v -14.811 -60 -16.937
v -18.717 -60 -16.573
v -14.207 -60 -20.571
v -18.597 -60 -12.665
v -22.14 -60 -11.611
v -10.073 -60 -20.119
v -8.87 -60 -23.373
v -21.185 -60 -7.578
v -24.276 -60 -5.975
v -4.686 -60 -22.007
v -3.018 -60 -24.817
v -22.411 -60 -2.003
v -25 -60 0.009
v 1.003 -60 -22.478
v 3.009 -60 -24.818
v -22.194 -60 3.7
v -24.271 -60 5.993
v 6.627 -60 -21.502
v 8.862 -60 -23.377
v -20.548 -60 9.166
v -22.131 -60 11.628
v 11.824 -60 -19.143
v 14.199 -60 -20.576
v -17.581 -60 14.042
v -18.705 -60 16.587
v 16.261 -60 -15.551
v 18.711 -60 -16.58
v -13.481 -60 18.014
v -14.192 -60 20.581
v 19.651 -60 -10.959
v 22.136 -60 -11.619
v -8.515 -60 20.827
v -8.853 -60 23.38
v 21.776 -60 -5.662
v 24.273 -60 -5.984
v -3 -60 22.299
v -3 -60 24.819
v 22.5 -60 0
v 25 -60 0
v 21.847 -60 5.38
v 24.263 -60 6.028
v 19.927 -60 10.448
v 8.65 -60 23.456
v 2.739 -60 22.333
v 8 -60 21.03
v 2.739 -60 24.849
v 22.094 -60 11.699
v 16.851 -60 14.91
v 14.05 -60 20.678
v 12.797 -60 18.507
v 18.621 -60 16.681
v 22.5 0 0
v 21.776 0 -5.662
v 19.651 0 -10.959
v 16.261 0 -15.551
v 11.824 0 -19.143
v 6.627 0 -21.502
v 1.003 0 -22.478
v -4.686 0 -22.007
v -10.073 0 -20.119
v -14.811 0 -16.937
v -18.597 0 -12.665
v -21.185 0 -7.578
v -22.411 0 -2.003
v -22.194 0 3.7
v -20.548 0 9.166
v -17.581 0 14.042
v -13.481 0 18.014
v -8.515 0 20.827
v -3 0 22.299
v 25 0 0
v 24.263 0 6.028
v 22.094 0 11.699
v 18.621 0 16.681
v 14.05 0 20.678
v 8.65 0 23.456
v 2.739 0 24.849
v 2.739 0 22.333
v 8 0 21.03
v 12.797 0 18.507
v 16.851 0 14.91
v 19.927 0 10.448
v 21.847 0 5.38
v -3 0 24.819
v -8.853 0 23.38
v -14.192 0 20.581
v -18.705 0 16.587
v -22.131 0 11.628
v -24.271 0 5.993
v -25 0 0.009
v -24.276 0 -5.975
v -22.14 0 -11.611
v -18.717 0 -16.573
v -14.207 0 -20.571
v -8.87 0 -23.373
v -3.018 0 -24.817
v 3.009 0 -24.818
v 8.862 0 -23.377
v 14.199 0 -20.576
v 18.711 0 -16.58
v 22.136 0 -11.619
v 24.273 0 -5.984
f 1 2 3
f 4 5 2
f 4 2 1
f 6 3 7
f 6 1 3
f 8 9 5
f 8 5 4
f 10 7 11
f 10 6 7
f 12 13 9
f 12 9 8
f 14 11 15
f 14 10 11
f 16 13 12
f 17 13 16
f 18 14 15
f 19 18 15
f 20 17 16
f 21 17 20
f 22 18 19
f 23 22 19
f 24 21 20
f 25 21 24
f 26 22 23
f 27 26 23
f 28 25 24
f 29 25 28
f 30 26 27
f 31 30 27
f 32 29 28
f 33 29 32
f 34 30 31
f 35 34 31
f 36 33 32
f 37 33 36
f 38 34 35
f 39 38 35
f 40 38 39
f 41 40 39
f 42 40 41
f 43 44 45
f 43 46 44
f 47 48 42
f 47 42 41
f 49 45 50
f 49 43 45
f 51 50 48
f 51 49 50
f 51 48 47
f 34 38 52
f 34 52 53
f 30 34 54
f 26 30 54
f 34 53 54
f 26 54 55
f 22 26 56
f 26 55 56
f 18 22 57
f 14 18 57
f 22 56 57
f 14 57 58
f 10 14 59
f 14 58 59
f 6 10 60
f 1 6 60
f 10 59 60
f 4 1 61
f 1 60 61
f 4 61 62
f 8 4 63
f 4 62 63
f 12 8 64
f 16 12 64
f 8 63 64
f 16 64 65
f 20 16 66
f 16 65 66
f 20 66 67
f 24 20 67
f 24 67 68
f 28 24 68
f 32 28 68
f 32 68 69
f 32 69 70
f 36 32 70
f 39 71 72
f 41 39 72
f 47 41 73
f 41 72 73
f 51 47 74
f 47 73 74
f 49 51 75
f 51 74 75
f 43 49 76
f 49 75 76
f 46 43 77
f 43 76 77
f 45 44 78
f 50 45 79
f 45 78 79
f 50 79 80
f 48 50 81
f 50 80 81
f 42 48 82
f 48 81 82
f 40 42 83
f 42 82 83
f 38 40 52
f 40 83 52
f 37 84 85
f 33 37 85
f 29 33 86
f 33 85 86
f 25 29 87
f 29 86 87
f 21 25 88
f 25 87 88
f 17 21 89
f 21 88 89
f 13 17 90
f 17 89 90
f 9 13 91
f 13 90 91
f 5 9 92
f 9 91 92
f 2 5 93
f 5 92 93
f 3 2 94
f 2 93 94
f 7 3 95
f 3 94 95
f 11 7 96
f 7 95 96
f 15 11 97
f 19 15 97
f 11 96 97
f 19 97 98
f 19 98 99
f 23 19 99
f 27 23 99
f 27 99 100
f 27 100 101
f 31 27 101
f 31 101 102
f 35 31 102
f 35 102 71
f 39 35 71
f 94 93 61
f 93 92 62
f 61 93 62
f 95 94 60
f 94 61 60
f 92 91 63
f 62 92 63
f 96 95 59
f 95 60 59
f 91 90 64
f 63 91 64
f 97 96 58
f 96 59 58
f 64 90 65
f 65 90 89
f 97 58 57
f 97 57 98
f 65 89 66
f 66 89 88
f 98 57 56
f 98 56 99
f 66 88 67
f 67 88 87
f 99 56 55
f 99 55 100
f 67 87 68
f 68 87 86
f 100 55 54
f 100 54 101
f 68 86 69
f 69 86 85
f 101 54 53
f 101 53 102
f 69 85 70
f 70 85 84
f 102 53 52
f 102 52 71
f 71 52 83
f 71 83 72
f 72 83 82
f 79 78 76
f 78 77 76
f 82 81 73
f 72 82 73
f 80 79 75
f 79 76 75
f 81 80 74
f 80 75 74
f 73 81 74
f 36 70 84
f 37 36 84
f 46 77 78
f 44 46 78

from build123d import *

# Parameters (mm, degrees)
F1_DEPTH = 60


with BuildPart() as f1:
    # F0 (on Front) → F1 (new body)
    with BuildSketch(Plane.XZ):
        with BuildLine():
            ThreePointArc((2.7394399513, 22.3326099853), (16.8506290521, 14.9099396561), (22.5, 0))
            ThreePointArc((22.5, 0), (-14.8113132436, -16.937384686), (-3, 22.299103121))
            Line((-3, 22.299103121), (-3, 24.819347292))
            ThreePointArc((-3, 24.819347292), (-16.5831239518, -18.7082869339), (25, 0))
            ThreePointArc((25, 0), (18.6210364747, 16.6810371563), (2.7394399513, 24.8494561058))
            Line((2.7394399513, 24.8494561058), (2.7394399513, 22.3326099853))
        make_face()
    extrude(amount=F1_DEPTH)


solid = f1.part
